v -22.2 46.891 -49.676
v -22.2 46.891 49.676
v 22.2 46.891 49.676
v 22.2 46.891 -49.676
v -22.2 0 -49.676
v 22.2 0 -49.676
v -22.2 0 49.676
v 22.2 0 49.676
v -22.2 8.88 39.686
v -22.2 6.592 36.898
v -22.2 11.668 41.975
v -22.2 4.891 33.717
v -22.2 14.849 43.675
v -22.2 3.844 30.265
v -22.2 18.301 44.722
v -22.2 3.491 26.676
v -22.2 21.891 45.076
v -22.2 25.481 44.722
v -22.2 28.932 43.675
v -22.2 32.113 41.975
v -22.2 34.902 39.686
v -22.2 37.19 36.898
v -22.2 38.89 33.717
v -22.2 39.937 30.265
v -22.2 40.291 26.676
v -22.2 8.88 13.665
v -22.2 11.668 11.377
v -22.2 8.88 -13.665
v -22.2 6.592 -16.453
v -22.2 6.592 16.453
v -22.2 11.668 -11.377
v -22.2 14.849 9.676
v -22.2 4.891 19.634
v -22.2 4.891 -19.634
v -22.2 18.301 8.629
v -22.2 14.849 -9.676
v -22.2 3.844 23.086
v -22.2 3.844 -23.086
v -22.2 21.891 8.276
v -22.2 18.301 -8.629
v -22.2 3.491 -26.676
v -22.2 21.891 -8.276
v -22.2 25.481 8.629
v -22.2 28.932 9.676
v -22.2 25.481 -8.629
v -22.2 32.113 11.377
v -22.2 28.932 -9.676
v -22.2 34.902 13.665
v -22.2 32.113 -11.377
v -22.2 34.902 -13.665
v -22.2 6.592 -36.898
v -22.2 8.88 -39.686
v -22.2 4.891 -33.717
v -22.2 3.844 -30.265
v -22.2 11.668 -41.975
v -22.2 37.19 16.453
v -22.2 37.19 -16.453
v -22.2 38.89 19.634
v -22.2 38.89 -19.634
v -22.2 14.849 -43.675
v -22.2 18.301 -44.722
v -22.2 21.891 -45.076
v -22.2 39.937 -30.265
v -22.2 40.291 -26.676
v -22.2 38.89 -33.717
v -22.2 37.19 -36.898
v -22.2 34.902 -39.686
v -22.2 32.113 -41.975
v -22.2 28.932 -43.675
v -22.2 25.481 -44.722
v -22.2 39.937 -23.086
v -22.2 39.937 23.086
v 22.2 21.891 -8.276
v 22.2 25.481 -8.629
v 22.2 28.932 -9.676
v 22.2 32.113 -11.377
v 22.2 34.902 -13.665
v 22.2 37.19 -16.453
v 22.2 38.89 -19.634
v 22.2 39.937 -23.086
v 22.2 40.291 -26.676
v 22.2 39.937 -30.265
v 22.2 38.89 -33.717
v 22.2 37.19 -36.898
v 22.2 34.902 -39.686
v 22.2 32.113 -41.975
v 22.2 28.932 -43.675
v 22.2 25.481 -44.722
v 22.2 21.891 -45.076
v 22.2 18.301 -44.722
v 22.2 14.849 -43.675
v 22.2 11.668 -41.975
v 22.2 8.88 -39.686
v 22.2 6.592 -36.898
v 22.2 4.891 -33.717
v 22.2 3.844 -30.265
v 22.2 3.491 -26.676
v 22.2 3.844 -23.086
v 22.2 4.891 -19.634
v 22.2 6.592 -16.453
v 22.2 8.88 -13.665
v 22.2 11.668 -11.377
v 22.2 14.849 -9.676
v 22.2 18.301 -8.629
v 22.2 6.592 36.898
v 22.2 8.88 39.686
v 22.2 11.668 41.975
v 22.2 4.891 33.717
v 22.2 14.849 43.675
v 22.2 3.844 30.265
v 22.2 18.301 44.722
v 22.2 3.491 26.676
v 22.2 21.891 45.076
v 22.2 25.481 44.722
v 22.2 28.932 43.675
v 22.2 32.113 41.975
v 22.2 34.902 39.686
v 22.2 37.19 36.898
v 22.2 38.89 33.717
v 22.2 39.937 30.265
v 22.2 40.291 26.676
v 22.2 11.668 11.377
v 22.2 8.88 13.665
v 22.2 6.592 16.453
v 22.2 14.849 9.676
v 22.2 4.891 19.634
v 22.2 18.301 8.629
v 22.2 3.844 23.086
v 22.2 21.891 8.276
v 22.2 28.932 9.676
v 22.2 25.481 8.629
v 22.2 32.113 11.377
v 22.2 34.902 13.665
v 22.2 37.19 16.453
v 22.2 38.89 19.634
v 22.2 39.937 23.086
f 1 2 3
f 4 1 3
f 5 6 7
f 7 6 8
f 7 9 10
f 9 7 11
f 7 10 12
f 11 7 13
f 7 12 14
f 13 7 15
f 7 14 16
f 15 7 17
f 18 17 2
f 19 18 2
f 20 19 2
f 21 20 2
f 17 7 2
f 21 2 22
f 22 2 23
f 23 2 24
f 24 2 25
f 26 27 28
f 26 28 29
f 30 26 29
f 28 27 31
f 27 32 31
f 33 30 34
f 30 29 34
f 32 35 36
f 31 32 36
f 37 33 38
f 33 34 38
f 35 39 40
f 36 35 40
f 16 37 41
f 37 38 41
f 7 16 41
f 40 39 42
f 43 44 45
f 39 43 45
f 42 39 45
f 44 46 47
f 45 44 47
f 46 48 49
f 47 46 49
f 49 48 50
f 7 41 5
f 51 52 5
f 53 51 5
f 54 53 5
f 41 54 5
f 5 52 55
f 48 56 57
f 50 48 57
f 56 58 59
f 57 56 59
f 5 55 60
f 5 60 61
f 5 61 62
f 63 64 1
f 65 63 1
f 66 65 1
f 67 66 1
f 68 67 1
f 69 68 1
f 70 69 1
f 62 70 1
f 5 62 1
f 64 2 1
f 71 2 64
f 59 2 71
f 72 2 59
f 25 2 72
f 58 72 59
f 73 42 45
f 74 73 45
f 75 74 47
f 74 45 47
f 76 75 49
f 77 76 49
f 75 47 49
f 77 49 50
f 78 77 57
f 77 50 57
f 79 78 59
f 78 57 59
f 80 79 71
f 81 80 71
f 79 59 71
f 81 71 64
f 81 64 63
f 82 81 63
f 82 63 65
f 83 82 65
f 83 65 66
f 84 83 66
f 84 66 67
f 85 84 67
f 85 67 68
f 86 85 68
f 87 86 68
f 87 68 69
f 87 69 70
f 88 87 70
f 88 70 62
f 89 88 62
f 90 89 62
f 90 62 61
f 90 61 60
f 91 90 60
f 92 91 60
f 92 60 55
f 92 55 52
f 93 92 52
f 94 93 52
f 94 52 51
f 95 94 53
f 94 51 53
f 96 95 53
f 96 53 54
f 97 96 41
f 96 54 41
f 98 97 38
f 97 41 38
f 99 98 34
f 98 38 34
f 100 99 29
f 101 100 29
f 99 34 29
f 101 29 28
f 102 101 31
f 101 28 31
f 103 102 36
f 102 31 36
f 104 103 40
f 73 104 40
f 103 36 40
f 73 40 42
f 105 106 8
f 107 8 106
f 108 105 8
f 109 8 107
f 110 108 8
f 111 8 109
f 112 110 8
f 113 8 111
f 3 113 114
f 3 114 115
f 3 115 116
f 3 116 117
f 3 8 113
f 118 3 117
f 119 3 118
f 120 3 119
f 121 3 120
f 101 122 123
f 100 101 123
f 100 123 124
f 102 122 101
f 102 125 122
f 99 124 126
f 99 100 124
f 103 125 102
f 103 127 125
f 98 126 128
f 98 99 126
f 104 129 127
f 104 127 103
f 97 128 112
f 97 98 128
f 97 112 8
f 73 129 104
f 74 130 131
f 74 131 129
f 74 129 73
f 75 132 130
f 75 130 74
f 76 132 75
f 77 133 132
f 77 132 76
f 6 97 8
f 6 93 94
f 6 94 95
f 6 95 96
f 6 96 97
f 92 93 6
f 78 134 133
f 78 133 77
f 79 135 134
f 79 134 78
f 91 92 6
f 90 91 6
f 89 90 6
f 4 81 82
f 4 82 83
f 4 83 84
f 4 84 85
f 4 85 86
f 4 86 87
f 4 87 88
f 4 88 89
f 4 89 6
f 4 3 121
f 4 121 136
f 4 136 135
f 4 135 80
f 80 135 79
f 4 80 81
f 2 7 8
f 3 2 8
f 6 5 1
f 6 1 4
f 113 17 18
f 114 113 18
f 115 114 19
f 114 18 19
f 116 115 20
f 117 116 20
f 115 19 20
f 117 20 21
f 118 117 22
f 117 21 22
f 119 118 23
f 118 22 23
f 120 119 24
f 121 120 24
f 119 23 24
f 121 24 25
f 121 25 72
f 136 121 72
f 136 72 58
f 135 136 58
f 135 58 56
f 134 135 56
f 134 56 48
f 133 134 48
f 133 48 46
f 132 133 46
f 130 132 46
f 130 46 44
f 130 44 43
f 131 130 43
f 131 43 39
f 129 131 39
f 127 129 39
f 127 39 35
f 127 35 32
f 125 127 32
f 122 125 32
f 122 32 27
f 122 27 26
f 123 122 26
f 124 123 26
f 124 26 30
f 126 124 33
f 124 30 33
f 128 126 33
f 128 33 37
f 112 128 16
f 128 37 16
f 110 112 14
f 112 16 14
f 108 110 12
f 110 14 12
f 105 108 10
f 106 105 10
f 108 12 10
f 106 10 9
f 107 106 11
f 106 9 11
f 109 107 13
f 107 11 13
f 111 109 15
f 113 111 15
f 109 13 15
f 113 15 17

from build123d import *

# Parameters (mm, degrees)
SKETCH1_R           = 75
BOSS_EXTRUDE1_DEPTH = 100
SKETCH2_OUTSIDE_W   = 198.904
SKETCH2_OUTSIDE_H   = 198.904
SKETCH2_OUTSIDE_W_2 = 44.4
SKETCH2_OUTSIDE_H_2 = 99.351371604
CUT_EXTRUDE1_DEPTH  = 146.773797371
SKETCH3_W           = 44.4
SKETCH3_H           = 53.109155611
CUT_EXTRUDE2_DEPTH  = 143.70085858
SKETCH4_R           = 18.4
CUT_EXTRUDE3_DEPTH  = 82.472603048


with BuildPart() as part:
    # Sketch1 → Boss-Extrude1 (new body)
    with BuildSketch(Plane(origin=(0, 0, 0), x_dir=(1, 0, 0), z_dir=(0, 1, 0))):
        with Locations(Location((0, 0, 0), (0, 0, 270))):
            Circle(SKETCH1_R)
    extrude(amount=BOSS_EXTRUDE1_DEPTH)

    # Sketch2 outside → Cut-Extrude1 (cut, through all)
    with BuildSketch(Plane(origin=(0, 100, 0), x_dir=(1, 0, 0), z_dir=(0, 1, 0))):
        Rectangle(SKETCH2_OUTSIDE_W, SKETCH2_OUTSIDE_H)
        Rectangle(SKETCH2_OUTSIDE_W_2, SKETCH2_OUTSIDE_H_2, mode=Mode.SUBTRACT)
    extrude(amount=-CUT_EXTRUDE1_DEPTH, mode=Mode.SUBTRACT)

    # Sketch3 → Cut-Extrude2 (cut, through all)
    with BuildSketch(Plane.XY.offset(49.675685802)):
        with Locations((0, 73.445422194)):
            Rectangle(SKETCH3_W, SKETCH3_H)
    extrude(amount=-CUT_EXTRUDE2_DEPTH, mode=Mode.SUBTRACT)

    # Sketch4 → Cut-Extrude3 (cut, through all)
    with BuildSketch(Plane.ZY.offset(22.2)):
        with Locations((26.675685802, 21.890844389)):
            Circle(SKETCH4_R)
        with Locations((-26.675685802, 21.890844389)):
            Circle(SKETCH4_R)
    extrude(amount=-CUT_EXTRUDE3_DEPTH, mode=Mode.SUBTRACT)


solid = part.part
